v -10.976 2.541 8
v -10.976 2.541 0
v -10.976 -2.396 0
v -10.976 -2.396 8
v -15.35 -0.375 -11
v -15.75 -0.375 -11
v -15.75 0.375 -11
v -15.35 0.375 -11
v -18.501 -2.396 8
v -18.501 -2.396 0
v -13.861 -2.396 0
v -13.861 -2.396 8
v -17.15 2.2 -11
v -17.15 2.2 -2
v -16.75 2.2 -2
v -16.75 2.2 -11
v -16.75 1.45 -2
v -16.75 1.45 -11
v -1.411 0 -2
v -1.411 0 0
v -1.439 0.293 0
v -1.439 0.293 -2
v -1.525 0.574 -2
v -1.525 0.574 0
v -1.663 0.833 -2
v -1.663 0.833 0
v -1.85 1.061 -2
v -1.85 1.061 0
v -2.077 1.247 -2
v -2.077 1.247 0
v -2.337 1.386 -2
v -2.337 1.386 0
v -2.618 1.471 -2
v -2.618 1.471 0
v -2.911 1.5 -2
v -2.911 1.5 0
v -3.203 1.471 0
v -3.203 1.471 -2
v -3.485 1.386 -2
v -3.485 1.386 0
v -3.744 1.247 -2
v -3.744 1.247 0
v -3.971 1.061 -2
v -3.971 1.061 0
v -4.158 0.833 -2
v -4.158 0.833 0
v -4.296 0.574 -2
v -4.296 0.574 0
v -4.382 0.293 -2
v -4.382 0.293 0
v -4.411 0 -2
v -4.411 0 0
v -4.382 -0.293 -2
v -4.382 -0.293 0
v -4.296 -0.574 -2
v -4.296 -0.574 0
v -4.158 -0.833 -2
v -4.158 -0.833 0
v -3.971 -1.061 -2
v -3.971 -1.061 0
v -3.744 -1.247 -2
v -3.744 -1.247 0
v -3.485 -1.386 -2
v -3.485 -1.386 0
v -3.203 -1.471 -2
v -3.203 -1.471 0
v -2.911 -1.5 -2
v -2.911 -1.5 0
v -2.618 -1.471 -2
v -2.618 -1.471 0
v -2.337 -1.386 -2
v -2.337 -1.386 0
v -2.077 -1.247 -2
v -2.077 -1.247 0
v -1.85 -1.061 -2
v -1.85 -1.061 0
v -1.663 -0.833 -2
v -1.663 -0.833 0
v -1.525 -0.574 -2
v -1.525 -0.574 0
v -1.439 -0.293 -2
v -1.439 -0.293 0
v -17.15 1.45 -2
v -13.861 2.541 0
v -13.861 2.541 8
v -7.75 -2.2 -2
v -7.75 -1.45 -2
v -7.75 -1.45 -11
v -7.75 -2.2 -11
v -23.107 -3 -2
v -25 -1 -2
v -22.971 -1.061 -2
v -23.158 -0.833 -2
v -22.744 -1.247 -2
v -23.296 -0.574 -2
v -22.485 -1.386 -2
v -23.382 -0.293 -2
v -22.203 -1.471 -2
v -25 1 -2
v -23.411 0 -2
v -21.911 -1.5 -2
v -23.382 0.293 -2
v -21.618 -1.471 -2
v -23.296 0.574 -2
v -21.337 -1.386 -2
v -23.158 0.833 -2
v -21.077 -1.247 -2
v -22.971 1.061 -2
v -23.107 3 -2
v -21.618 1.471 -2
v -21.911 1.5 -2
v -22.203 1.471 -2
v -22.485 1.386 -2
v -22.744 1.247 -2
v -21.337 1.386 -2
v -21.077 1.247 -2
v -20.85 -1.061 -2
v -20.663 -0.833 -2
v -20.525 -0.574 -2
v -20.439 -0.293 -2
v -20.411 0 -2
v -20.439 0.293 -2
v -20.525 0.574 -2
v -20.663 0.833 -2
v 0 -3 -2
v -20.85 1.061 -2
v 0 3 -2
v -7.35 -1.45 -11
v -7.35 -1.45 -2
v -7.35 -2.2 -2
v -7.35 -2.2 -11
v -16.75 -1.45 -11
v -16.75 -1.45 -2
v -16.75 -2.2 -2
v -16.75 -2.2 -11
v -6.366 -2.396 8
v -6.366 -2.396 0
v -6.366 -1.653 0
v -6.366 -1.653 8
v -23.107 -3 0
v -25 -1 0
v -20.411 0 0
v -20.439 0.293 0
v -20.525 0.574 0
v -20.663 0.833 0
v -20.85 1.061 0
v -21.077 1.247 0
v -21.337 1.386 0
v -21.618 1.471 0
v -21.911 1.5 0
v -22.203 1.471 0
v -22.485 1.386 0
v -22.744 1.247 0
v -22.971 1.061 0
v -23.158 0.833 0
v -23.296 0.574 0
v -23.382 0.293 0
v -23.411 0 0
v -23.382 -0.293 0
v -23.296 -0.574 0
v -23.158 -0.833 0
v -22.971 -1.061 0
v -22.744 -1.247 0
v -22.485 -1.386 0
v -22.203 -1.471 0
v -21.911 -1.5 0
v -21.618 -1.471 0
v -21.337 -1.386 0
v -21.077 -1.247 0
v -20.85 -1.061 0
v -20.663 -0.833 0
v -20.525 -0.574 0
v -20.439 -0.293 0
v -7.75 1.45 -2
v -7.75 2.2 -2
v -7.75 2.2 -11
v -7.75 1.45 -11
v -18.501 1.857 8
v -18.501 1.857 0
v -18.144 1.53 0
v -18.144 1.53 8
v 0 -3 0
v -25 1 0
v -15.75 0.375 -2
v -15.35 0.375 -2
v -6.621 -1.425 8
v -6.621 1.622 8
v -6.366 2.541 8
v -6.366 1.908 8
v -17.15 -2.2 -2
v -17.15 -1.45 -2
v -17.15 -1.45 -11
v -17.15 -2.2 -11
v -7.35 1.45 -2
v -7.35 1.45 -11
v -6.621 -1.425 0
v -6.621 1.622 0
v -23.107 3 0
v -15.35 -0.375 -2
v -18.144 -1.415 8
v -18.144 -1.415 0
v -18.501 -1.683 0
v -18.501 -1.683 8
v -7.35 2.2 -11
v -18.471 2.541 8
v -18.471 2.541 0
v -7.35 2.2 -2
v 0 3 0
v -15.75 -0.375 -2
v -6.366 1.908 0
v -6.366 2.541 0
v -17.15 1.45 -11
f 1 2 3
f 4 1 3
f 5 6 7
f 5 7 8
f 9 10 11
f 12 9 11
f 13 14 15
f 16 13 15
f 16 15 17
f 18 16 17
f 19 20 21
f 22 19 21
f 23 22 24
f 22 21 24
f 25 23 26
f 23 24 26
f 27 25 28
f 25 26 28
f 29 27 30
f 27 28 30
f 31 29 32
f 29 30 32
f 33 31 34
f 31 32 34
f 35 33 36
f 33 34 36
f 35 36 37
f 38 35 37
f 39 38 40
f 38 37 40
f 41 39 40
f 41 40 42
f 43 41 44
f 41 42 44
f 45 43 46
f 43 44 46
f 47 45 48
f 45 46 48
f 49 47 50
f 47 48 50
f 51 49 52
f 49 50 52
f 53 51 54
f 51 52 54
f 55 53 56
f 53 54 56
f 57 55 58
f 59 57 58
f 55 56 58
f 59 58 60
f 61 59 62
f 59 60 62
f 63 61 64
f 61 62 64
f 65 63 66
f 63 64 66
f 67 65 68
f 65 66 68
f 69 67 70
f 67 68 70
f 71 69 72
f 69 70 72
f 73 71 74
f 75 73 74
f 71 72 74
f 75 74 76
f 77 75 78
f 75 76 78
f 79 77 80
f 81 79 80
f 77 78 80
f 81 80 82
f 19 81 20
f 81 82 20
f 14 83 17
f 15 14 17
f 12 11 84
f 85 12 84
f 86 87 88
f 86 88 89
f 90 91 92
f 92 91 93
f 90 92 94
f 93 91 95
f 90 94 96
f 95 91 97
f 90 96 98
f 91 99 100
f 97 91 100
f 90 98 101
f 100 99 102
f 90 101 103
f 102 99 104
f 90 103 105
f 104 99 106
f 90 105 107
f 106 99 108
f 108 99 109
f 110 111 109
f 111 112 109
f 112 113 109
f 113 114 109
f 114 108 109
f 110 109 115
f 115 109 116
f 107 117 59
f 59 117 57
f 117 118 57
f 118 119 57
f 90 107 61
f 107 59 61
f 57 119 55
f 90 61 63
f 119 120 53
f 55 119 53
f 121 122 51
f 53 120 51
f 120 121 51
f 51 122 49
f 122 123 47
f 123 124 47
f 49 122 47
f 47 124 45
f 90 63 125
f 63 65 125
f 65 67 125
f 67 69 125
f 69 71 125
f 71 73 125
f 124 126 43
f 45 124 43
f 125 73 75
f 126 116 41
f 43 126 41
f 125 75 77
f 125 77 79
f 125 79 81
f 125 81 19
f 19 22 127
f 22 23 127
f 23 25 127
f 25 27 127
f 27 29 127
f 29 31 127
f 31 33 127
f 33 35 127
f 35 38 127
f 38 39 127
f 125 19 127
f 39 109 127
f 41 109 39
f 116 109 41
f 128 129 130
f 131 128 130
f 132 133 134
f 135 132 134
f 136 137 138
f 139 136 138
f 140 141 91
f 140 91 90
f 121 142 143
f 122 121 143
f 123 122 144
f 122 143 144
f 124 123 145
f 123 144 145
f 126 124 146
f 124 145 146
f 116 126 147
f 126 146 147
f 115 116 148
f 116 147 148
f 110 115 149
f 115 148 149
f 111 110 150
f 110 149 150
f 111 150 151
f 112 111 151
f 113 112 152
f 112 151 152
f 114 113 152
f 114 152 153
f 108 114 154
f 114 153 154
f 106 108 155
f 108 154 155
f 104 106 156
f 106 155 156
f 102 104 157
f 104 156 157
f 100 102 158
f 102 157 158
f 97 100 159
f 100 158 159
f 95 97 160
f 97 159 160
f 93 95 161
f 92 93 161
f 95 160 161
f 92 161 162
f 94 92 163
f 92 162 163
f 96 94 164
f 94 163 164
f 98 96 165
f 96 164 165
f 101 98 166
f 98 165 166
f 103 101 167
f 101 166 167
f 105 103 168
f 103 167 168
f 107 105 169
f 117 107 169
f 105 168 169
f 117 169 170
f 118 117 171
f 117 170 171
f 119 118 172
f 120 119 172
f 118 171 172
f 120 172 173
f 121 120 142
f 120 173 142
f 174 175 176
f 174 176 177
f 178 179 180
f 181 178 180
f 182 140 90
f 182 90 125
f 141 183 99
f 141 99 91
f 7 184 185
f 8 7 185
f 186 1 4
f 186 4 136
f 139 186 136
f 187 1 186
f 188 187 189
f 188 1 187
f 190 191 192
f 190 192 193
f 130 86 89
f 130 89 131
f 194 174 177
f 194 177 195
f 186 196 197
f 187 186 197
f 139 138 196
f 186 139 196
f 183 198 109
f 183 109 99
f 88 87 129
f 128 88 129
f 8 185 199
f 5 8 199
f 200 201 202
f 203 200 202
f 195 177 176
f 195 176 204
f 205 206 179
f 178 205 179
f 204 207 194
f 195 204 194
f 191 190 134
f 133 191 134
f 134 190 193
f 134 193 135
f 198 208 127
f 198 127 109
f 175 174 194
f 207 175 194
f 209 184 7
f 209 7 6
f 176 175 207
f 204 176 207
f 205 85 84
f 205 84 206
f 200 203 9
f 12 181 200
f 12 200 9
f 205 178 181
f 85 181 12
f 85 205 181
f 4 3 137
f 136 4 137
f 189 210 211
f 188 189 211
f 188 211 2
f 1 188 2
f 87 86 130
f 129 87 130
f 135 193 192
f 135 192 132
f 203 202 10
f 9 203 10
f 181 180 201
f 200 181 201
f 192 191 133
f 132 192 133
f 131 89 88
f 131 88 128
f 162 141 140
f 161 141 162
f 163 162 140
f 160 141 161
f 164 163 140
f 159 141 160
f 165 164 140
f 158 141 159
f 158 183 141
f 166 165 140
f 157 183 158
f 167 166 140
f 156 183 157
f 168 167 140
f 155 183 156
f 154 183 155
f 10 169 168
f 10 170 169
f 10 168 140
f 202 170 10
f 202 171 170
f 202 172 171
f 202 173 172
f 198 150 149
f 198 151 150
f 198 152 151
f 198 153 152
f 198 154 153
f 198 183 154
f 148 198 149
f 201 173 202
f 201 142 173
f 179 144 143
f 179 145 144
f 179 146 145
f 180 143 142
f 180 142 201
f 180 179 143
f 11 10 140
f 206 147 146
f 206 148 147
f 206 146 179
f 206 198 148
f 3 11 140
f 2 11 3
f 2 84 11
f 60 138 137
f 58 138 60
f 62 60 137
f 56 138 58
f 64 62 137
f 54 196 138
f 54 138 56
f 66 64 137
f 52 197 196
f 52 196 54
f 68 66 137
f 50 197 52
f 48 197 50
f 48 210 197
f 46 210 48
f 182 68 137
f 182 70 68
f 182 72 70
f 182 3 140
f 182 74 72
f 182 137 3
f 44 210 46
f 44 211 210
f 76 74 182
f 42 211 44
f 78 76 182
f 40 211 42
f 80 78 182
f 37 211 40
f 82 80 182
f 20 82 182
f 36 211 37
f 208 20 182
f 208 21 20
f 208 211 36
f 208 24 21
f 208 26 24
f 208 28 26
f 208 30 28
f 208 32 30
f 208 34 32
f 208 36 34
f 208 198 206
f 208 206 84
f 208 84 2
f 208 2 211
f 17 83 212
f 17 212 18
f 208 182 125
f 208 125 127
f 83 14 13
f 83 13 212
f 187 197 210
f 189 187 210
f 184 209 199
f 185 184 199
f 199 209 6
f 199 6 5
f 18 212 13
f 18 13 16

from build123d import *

# Parameters (mm, degrees)
F0_R     = 1.5
F1_DEPTH = 2
F2_DEPTH = 8
F3_W     = 0.4
F3_H     = 0.75
F4_DEPTH = 9


with BuildPart() as f1:
    # F0 (on Top) → F1 (new body)
    with BuildSketch(Plane.XY):
        Polygon((0, 3), (-23.106798, 3), (-25, 1), (-25, -1), (-23.106798, -3), (0, -3), align=None)
        with Locations((-21.910676, 0)):
            Circle(F0_R, mode=Mode.SUBTRACT)
        Polygon((-18.500659, 1.856685), (-18.470918, 2.540756), (-13.860874, 2.540756), (-13.860874, -2.396453), (-18.500659, -2.396453), (-18.500659, -1.68264), (-18.143752, -1.414959), (-18.143752, 1.529521), align=None, mode=Mode.SUBTRACT)
        Polygon((-10.975876, -2.396453), (-10.975876, 2.540756), (-6.365833, 2.540756), (-6.365833, 1.907852), (-6.620977, 1.622134), (-6.620977, -1.425057), (-6.365833, -1.652897), (-6.365833, -2.396453), align=None, mode=Mode.SUBTRACT)
        with Locations((-2.910676, 0)):
            Circle(F0_R, mode=Mode.SUBTRACT)
        Polygon((-13.860874, 2.540756), (-18.470918, 2.540756), (-18.500659, 1.856685), (-18.143752, 1.529521), (-18.143752, -1.414959), (-18.500659, -1.68264), (-18.500659, -2.396453), (-13.860874, -2.396453), align=None)
        Polygon((-6.365833, 2.540756), (-10.975876, 2.540756), (-10.975876, -2.396453), (-6.365833, -2.396453), (-6.365833, -1.652897), (-6.620977, -1.425057), (-6.620977, 1.622134), (-6.365833, 1.907852), align=None)
    extrude(amount=-F1_DEPTH)

    # F0 (on Top) → F2 (join)
    with BuildSketch(Plane.XY):
        Polygon((-13.860874, 2.540756), (-18.470918, 2.540756), (-18.500659, 1.856685), (-18.143752, 1.529521), (-18.143752, -1.414959), (-18.500659, -1.68264), (-18.500659, -2.396453), (-13.860874, -2.396453), align=None)
        Polygon((-6.365833, 2.540756), (-10.975876, 2.540756), (-10.975876, -2.396453), (-6.365833, -2.396453), (-6.365833, -1.652897), (-6.620977, -1.425057), (-6.620977, 1.622134), (-6.365833, 1.907852), align=None)
    extrude(amount=F2_DEPTH)


with BuildPart() as f4:
    # F3 (on face) → F4 (new body)
    with BuildSketch(Plane(origin=(0, 0, -2), x_dir=(1, 0, 0), z_dir=(0, 0, -1))):
        with Locations((-16.95, 1.825)):
            Rectangle(F3_W, F3_H)
        with Locations((-15.55, 0)):
            Rectangle(F3_W, F3_H)
        with Locations((-7.55, 1.825)):
            Rectangle(F3_W, F3_H)
        with Locations((-16.95, -1.825)):
            Rectangle(F3_W, F3_H)
        with Locations((-7.55, -1.825)):
            Rectangle(F3_W, F3_H)
    extrude(amount=F4_DEPTH)


solid = Compound([f1.part, f4.part])
